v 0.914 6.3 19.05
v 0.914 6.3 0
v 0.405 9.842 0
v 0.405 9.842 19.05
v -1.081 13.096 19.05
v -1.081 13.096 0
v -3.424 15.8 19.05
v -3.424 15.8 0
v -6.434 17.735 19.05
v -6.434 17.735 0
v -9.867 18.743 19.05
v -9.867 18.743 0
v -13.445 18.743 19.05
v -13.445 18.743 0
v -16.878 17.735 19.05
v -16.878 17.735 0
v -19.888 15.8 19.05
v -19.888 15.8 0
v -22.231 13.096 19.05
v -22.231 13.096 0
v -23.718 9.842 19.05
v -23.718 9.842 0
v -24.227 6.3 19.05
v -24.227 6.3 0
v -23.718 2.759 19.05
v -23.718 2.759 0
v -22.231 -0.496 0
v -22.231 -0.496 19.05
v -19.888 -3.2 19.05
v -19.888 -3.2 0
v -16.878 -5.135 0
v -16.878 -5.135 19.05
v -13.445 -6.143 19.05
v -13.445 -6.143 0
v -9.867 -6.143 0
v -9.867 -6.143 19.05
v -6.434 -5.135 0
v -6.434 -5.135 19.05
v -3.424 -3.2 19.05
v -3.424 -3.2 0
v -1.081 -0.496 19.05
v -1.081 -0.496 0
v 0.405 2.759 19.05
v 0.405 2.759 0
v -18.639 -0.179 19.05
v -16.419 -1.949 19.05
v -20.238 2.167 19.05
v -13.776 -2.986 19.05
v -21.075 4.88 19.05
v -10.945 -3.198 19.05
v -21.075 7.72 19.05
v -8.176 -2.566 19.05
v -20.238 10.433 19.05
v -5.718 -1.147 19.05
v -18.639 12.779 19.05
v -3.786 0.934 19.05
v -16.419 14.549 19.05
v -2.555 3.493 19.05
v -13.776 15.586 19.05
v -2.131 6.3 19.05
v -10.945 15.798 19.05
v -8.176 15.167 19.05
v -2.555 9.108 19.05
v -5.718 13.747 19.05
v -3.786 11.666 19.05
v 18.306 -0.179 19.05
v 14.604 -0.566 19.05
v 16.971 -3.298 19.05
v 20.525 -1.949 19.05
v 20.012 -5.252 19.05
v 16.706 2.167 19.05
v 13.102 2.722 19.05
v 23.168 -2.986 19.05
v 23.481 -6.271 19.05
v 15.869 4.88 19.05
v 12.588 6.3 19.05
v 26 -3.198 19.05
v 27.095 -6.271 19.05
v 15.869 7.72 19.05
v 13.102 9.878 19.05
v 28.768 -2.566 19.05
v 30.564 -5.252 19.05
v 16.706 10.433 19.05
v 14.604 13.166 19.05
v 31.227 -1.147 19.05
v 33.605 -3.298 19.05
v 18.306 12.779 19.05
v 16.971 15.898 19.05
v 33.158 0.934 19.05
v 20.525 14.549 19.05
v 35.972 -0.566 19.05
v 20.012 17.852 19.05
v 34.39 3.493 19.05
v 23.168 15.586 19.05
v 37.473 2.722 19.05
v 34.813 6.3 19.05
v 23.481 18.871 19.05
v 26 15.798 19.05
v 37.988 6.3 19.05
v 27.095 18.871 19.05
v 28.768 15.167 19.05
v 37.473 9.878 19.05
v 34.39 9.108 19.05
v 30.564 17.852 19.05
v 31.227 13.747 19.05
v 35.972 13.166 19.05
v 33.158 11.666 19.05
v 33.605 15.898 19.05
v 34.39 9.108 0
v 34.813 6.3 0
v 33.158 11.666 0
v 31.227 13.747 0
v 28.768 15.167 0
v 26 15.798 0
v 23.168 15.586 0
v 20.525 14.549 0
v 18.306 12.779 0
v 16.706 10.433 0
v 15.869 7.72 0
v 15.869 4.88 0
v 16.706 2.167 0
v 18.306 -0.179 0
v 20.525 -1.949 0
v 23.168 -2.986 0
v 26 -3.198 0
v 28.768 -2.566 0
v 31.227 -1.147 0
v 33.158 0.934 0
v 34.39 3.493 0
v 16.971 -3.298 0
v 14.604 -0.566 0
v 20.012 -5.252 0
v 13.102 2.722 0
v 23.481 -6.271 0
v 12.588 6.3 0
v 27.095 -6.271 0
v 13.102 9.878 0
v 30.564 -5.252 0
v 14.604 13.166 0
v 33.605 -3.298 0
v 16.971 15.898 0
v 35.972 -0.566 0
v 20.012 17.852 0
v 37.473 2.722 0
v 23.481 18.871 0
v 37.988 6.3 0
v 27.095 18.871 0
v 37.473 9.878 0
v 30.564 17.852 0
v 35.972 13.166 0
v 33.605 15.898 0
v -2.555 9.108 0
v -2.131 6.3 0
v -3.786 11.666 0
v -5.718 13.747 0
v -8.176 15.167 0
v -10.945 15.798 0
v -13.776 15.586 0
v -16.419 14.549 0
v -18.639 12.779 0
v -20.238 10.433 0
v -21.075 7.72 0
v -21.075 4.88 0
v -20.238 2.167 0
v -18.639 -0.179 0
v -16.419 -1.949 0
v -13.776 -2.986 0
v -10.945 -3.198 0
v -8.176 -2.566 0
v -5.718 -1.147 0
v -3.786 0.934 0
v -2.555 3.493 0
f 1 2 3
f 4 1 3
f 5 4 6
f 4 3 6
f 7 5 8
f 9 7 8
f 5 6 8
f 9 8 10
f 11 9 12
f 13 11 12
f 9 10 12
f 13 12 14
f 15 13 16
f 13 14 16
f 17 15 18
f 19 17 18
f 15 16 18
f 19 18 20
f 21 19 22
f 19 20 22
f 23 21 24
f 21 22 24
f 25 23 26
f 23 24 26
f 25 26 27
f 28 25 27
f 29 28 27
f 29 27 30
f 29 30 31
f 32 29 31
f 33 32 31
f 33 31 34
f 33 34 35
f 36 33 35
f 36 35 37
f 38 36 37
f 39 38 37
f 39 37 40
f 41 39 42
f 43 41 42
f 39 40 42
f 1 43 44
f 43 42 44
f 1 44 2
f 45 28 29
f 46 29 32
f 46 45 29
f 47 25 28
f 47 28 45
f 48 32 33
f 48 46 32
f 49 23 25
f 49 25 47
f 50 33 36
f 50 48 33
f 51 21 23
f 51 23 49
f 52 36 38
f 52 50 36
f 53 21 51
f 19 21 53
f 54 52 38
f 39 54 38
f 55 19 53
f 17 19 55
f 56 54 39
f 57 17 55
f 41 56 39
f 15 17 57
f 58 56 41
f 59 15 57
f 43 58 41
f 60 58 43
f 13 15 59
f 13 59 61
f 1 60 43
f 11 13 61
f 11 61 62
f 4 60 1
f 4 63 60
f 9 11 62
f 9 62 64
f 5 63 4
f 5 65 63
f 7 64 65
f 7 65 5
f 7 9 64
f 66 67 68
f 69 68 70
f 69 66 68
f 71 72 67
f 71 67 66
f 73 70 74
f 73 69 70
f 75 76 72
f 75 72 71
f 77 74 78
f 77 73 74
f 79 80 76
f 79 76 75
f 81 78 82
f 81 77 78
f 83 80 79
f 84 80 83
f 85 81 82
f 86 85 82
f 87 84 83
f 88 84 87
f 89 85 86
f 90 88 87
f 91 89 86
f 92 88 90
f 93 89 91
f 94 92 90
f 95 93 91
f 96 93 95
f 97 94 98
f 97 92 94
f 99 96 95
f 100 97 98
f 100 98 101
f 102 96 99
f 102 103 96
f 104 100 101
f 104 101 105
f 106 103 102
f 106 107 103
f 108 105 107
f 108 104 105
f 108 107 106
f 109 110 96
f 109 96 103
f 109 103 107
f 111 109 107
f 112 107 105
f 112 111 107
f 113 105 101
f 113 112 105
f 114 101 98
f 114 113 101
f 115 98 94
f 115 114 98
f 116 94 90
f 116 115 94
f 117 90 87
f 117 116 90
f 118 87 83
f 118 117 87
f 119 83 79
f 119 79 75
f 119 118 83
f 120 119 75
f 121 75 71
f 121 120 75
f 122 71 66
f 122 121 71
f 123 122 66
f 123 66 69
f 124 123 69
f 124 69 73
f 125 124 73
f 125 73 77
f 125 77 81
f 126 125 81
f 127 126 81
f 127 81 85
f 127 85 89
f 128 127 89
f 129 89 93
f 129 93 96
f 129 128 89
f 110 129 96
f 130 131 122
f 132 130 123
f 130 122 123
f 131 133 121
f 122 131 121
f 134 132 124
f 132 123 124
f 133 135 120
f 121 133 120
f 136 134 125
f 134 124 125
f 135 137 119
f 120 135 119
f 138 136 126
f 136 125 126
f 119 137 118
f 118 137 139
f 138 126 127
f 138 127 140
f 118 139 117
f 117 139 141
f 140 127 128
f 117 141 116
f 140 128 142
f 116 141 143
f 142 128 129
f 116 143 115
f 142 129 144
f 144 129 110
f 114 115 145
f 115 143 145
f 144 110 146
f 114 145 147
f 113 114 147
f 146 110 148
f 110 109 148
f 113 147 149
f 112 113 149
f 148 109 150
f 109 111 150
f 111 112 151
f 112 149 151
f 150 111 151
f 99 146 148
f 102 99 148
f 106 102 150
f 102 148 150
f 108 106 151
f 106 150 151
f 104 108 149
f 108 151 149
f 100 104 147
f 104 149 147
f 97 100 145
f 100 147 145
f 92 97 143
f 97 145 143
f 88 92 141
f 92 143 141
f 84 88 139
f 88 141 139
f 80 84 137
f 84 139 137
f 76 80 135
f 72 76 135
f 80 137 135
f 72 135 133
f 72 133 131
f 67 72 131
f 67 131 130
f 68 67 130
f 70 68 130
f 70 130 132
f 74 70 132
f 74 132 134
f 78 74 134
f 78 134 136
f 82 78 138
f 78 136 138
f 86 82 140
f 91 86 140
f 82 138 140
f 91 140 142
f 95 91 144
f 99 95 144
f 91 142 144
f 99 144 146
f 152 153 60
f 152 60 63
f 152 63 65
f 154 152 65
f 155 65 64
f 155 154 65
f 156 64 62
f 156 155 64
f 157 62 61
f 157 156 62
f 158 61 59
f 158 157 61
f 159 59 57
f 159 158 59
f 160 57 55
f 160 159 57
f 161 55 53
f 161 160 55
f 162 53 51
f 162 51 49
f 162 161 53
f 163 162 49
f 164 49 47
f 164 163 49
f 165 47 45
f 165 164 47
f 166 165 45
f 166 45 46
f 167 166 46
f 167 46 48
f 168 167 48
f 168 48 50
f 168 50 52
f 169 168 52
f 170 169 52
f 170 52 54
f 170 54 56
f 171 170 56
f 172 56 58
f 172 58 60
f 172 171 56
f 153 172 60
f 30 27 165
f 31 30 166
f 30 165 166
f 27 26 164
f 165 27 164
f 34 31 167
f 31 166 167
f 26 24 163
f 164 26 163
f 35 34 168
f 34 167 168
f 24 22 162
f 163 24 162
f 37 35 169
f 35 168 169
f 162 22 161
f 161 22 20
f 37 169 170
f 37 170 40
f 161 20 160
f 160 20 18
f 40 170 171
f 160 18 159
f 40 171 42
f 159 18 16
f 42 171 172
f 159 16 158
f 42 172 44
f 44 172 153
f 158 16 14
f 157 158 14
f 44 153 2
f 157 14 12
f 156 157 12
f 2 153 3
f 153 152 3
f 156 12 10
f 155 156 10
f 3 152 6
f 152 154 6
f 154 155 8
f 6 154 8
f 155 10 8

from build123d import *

# Parameters (mm, degrees)
F0_R     = 12.7
F0_R_2   = 9.525
F0_R_3   = 12.570583
F1_DEPTH = 19.05


with BuildPart() as f1:
    # F0 (on Top) → F1 (new body)
    with BuildSketch(Plane.XY):
        with Locations((25.287937, 6.300088)):
            Circle(F0_R)
        with Locations((25.287937, 6.300088)):
            Circle(F0_R_2, mode=Mode.SUBTRACT)
        with Locations((-11.656331, 6.300088)):
            Circle(F0_R_3)
        with Locations((-11.656331, 6.300088)):
            Circle(F0_R_2, mode=Mode.SUBTRACT)
    extrude(amount=F1_DEPTH)


solid = f1.part
